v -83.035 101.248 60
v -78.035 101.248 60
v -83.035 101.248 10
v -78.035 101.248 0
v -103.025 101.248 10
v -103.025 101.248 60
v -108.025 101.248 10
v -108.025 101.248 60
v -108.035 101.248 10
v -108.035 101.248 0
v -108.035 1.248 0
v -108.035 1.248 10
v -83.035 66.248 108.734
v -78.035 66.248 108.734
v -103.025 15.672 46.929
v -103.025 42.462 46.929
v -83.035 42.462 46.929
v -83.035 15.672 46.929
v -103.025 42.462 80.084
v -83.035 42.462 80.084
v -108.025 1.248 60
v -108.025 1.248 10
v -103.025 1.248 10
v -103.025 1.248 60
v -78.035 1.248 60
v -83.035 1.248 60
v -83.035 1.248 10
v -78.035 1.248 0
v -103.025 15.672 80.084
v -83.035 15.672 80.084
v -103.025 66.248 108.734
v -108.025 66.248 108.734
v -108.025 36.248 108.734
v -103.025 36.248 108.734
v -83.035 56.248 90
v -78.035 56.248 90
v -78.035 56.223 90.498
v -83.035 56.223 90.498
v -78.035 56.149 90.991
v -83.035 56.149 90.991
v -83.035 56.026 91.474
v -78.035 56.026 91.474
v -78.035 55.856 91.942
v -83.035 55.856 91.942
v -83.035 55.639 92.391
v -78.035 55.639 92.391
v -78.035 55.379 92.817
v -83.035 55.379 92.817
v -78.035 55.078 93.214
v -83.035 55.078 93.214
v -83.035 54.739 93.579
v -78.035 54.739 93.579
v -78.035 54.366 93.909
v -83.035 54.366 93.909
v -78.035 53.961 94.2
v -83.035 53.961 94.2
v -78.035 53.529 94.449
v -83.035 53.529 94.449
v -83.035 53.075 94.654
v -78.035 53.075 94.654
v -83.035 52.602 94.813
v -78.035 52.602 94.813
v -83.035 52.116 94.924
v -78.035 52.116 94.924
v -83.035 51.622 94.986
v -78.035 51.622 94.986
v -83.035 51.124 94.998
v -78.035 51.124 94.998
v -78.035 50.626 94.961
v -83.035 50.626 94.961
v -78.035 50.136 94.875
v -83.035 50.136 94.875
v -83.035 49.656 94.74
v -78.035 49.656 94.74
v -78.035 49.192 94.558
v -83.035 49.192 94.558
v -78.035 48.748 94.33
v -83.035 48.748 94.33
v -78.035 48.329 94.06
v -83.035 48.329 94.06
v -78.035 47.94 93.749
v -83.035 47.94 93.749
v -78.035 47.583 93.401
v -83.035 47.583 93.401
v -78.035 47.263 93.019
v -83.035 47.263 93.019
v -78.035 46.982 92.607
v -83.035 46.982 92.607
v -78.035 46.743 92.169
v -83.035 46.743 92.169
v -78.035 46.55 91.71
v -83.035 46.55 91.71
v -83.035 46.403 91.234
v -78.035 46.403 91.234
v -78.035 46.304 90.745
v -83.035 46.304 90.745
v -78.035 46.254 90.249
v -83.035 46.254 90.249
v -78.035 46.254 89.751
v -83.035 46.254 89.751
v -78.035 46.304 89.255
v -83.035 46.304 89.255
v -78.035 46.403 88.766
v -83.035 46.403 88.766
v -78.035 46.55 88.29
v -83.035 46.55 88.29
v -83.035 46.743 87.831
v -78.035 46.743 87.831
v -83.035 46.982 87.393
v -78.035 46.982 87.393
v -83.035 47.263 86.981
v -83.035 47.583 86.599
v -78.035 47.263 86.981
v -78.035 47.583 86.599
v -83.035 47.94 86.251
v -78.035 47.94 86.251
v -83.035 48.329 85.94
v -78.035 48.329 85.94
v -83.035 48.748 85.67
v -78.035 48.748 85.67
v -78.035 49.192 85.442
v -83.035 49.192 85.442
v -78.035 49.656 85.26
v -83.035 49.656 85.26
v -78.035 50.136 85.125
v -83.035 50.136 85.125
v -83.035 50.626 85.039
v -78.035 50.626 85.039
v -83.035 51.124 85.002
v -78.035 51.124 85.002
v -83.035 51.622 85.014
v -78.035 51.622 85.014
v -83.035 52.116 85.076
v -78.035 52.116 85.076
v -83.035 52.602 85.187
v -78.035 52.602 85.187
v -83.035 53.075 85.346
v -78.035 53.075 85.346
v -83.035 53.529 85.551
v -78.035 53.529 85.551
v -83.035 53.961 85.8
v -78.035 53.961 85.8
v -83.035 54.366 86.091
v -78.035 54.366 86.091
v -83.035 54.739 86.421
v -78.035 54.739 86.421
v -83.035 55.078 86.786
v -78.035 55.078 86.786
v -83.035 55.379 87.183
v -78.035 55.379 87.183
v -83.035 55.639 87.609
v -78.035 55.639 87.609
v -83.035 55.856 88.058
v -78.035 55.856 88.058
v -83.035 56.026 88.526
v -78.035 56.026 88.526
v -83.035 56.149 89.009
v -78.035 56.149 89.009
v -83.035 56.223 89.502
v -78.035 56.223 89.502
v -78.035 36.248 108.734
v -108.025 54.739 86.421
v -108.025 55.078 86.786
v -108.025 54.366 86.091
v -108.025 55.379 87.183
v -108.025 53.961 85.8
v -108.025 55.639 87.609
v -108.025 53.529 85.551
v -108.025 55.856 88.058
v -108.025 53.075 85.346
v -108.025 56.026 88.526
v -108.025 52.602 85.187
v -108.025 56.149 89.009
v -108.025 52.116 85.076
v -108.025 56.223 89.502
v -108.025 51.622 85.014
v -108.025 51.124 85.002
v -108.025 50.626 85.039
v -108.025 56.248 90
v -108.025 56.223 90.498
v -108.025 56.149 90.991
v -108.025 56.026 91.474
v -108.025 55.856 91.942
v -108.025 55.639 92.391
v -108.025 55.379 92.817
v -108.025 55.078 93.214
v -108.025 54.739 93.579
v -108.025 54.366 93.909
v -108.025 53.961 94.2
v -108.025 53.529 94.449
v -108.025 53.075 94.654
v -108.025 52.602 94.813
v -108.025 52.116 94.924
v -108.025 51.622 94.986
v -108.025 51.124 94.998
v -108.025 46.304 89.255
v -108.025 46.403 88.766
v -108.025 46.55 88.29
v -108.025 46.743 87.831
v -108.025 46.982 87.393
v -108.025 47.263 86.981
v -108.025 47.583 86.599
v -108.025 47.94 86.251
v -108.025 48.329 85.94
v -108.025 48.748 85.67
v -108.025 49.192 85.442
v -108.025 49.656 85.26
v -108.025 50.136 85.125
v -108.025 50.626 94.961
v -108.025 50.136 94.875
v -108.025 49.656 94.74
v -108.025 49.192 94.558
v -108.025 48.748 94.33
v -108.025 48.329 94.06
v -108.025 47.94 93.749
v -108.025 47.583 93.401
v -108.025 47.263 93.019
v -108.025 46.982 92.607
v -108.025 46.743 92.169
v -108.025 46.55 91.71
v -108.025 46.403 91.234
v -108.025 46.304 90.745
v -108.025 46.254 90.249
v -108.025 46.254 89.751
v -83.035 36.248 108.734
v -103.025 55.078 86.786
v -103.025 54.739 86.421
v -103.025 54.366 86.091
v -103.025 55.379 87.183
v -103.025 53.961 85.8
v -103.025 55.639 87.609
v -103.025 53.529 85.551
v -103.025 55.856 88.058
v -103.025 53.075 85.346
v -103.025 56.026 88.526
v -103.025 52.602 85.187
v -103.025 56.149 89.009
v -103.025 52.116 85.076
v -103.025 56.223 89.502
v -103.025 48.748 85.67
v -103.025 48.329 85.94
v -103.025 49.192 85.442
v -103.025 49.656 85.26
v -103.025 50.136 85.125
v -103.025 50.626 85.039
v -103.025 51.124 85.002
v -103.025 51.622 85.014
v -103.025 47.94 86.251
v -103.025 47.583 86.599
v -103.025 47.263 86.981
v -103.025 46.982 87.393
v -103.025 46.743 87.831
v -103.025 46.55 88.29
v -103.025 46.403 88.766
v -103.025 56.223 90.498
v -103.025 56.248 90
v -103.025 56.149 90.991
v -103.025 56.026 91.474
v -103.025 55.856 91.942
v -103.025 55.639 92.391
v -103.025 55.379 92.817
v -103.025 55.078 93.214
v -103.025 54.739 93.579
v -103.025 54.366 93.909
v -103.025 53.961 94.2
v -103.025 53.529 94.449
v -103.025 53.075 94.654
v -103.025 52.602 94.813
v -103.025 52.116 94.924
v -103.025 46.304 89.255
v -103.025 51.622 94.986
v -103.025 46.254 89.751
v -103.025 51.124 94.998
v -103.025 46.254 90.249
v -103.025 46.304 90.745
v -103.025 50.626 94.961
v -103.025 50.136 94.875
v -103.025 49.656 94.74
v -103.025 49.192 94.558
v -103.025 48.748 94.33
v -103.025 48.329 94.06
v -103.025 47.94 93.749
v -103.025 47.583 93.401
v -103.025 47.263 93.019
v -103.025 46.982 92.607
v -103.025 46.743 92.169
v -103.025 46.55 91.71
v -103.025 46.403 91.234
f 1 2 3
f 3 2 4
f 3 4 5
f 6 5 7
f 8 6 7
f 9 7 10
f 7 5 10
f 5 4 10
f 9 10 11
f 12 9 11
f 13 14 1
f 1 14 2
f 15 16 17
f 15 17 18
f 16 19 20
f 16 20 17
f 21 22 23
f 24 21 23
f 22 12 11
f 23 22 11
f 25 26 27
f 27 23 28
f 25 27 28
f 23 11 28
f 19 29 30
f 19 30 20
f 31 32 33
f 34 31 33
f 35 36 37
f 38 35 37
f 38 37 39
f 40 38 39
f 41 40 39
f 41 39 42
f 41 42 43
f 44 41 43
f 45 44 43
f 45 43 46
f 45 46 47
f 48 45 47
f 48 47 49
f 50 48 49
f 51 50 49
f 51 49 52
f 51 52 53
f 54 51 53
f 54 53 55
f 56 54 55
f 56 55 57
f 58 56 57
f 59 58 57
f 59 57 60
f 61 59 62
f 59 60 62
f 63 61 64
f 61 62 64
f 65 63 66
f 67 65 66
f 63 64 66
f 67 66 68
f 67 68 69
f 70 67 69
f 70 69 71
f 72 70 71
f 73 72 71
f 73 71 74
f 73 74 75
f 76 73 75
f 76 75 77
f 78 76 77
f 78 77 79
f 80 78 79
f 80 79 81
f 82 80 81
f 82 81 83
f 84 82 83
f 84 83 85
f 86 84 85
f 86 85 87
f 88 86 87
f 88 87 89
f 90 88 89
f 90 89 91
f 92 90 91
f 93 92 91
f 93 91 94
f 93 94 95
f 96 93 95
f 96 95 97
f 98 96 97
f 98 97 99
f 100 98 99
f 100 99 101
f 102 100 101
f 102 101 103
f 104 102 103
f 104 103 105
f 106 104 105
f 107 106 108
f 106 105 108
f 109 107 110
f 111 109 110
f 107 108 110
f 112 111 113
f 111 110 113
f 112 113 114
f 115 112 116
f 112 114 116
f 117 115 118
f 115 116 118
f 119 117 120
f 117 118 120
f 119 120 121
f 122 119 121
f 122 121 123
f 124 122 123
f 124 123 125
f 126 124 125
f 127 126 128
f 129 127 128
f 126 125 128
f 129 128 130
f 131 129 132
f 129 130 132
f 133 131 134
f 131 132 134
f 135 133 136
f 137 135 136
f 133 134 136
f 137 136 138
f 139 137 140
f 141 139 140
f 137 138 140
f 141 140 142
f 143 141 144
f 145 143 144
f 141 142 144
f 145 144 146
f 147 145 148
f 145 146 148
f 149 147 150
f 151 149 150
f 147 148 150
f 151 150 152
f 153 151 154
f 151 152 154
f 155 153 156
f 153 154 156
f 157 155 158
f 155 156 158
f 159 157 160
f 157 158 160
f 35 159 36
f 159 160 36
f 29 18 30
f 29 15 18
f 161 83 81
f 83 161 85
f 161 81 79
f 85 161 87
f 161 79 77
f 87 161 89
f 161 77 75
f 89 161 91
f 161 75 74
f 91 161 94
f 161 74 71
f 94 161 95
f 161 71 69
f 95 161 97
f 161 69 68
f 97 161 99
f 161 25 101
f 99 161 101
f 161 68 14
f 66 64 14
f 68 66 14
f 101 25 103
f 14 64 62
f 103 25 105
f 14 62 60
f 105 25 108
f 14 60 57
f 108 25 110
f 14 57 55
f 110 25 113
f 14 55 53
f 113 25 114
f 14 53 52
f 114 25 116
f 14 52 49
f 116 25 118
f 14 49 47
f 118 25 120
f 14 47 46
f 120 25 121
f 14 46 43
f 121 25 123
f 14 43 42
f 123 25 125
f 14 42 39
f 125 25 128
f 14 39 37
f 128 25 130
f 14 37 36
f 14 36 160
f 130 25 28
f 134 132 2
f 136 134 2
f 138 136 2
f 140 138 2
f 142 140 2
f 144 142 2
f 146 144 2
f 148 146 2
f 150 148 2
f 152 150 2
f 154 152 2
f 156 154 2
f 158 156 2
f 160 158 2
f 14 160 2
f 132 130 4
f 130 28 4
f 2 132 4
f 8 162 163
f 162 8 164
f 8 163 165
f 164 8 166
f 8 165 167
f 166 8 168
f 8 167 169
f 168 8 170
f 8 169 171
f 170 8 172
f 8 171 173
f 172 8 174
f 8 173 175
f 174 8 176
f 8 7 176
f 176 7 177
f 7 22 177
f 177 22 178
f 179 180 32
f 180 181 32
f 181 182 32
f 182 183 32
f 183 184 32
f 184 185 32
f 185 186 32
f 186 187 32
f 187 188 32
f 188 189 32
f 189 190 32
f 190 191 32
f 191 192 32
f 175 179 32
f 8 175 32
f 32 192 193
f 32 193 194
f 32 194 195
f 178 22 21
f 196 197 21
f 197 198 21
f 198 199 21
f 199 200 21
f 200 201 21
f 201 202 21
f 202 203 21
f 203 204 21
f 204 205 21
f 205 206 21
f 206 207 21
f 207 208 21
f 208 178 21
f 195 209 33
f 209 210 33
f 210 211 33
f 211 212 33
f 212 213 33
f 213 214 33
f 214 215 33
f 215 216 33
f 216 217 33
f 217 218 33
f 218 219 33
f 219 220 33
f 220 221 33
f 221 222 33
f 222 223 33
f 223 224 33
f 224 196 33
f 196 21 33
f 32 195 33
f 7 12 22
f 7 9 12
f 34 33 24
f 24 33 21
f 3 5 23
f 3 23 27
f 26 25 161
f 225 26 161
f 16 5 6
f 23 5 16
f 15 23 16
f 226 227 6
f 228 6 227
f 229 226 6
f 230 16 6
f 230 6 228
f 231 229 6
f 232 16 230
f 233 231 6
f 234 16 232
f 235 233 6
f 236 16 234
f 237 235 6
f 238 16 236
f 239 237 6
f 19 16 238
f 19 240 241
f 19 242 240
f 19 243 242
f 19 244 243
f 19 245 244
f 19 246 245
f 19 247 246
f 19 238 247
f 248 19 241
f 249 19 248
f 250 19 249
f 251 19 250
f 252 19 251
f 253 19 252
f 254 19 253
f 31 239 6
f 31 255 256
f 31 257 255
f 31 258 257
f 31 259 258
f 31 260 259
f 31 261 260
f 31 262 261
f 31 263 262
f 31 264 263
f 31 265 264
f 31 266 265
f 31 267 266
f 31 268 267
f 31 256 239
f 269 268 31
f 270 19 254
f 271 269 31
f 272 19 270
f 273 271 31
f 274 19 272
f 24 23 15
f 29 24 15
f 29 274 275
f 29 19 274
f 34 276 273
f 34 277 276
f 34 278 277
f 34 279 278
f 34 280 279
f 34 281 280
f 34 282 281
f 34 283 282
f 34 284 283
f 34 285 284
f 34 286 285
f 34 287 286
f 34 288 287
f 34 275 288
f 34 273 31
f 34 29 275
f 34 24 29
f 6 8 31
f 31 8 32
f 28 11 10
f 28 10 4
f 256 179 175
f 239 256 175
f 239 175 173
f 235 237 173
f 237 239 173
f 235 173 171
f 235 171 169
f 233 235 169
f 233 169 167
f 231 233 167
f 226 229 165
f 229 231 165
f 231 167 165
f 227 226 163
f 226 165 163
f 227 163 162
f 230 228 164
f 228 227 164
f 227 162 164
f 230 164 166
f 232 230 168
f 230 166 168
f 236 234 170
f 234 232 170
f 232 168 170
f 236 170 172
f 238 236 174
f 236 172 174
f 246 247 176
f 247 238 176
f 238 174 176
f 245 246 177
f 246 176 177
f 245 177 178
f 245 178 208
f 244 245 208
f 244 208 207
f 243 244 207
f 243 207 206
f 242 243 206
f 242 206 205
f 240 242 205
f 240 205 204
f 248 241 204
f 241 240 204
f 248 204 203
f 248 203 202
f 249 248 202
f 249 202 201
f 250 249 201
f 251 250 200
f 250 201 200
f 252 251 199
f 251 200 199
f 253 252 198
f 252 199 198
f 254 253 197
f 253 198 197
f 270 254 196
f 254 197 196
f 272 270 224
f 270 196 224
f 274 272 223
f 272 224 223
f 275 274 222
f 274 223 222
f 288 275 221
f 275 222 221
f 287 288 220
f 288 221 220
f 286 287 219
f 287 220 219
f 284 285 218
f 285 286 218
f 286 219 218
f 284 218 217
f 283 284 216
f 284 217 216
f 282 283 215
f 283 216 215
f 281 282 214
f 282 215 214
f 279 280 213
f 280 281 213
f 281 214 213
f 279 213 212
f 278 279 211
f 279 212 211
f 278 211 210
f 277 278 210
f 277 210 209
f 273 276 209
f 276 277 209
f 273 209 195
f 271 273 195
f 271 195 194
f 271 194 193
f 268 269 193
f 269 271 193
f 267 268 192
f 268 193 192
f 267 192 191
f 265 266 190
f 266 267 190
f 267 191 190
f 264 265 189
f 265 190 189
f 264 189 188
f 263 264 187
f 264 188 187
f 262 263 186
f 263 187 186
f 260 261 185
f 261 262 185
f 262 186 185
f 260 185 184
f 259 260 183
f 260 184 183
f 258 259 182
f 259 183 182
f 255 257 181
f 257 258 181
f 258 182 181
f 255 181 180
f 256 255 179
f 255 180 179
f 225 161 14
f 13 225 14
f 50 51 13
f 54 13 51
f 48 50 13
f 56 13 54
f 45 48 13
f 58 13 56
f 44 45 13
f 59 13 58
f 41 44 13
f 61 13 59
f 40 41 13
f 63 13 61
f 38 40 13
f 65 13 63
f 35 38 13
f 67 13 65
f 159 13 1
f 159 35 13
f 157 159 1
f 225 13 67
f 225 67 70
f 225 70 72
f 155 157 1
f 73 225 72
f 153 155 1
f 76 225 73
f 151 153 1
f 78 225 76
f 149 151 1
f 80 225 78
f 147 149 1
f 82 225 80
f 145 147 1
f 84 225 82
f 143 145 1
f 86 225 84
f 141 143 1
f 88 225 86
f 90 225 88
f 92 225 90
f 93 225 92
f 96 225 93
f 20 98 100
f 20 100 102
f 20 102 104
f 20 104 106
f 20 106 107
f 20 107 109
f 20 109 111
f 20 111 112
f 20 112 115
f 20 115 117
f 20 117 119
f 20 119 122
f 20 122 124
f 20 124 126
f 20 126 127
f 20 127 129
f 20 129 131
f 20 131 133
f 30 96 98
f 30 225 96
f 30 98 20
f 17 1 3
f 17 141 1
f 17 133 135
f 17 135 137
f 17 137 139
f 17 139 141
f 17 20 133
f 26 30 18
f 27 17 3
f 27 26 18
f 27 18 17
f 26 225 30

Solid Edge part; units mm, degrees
sketch "Sketch1" plane through (0, 0, 0) normal (0, 0, 1) x (1, 0, 0)
  line L0 (-108.0347, 1.2482) -> (-78.0347, 1.2482)
  line L1 (-78.0347, 1.2482) -> (-78.0347, 101.2482)
  line L2 (-78.0347, 101.2482) -> (-108.0347, 101.2482)
  line L3 (-108.0347, 101.2482) -> (-108.0347, 1.2482)
  dimension "D1" = 100
  dimension "D2" = 30
extrude "Protrusion1" add sketch "Sketch1" along normal blind 10
sketch "Sketch2" plane through (-78.0347, 51.2482, 5) normal (1, 0, 0) x (0, 1, 0)
  circle A0 centre (0, 85) radius 5
  line L0 (-50, 5) -> (-50, 55)
  line L1 (-50, 55) -> (-15, 103.734)
  line L2 (-15, 103.734) -> (15, 103.734)
  line L3 (15, 103.734) -> (50, 55)
  line L4 (50, 55) -> (50, 5)
  line L5 (50, 5) -> (-50, 5)
  dimension "D1" = 50
  dimension "D2" = 50
  dimension "D3" = 10
  dimension "D4" = 80
  dimension "D5" = 60
  dimension "D6" = 60
  dimension "D7" = 30
  dimension "D8" = 100
extrude "ExtrudedProtrusion_2" add sketch "Sketch2" against normal blind 5
mirror "Mirror1" about plane through (-93.03, 0, 0) normal (1, 0, 0) of "ExtrudedProtrusion_2"
sketch "Sketch3" plane through (-103.0253, 51.2482, 59.367) normal (1, 0, 0) x (0, 1, 0)
  line L0 (-35.5759, 20.7171) -> (-8.7862, 20.7171)
  line L1 (-8.7862, 20.7171) -> (-8.7862, -12.4376)
  line L2 (-8.7862, -12.4376) -> (-35.5759, -12.4376)
  line L3 (-35.5759, -12.4376) -> (-35.5759, 20.7171)
extrude "Protrusion3" add sketch "Sketch3" along normal up to vertex (19.9907 mm away)
